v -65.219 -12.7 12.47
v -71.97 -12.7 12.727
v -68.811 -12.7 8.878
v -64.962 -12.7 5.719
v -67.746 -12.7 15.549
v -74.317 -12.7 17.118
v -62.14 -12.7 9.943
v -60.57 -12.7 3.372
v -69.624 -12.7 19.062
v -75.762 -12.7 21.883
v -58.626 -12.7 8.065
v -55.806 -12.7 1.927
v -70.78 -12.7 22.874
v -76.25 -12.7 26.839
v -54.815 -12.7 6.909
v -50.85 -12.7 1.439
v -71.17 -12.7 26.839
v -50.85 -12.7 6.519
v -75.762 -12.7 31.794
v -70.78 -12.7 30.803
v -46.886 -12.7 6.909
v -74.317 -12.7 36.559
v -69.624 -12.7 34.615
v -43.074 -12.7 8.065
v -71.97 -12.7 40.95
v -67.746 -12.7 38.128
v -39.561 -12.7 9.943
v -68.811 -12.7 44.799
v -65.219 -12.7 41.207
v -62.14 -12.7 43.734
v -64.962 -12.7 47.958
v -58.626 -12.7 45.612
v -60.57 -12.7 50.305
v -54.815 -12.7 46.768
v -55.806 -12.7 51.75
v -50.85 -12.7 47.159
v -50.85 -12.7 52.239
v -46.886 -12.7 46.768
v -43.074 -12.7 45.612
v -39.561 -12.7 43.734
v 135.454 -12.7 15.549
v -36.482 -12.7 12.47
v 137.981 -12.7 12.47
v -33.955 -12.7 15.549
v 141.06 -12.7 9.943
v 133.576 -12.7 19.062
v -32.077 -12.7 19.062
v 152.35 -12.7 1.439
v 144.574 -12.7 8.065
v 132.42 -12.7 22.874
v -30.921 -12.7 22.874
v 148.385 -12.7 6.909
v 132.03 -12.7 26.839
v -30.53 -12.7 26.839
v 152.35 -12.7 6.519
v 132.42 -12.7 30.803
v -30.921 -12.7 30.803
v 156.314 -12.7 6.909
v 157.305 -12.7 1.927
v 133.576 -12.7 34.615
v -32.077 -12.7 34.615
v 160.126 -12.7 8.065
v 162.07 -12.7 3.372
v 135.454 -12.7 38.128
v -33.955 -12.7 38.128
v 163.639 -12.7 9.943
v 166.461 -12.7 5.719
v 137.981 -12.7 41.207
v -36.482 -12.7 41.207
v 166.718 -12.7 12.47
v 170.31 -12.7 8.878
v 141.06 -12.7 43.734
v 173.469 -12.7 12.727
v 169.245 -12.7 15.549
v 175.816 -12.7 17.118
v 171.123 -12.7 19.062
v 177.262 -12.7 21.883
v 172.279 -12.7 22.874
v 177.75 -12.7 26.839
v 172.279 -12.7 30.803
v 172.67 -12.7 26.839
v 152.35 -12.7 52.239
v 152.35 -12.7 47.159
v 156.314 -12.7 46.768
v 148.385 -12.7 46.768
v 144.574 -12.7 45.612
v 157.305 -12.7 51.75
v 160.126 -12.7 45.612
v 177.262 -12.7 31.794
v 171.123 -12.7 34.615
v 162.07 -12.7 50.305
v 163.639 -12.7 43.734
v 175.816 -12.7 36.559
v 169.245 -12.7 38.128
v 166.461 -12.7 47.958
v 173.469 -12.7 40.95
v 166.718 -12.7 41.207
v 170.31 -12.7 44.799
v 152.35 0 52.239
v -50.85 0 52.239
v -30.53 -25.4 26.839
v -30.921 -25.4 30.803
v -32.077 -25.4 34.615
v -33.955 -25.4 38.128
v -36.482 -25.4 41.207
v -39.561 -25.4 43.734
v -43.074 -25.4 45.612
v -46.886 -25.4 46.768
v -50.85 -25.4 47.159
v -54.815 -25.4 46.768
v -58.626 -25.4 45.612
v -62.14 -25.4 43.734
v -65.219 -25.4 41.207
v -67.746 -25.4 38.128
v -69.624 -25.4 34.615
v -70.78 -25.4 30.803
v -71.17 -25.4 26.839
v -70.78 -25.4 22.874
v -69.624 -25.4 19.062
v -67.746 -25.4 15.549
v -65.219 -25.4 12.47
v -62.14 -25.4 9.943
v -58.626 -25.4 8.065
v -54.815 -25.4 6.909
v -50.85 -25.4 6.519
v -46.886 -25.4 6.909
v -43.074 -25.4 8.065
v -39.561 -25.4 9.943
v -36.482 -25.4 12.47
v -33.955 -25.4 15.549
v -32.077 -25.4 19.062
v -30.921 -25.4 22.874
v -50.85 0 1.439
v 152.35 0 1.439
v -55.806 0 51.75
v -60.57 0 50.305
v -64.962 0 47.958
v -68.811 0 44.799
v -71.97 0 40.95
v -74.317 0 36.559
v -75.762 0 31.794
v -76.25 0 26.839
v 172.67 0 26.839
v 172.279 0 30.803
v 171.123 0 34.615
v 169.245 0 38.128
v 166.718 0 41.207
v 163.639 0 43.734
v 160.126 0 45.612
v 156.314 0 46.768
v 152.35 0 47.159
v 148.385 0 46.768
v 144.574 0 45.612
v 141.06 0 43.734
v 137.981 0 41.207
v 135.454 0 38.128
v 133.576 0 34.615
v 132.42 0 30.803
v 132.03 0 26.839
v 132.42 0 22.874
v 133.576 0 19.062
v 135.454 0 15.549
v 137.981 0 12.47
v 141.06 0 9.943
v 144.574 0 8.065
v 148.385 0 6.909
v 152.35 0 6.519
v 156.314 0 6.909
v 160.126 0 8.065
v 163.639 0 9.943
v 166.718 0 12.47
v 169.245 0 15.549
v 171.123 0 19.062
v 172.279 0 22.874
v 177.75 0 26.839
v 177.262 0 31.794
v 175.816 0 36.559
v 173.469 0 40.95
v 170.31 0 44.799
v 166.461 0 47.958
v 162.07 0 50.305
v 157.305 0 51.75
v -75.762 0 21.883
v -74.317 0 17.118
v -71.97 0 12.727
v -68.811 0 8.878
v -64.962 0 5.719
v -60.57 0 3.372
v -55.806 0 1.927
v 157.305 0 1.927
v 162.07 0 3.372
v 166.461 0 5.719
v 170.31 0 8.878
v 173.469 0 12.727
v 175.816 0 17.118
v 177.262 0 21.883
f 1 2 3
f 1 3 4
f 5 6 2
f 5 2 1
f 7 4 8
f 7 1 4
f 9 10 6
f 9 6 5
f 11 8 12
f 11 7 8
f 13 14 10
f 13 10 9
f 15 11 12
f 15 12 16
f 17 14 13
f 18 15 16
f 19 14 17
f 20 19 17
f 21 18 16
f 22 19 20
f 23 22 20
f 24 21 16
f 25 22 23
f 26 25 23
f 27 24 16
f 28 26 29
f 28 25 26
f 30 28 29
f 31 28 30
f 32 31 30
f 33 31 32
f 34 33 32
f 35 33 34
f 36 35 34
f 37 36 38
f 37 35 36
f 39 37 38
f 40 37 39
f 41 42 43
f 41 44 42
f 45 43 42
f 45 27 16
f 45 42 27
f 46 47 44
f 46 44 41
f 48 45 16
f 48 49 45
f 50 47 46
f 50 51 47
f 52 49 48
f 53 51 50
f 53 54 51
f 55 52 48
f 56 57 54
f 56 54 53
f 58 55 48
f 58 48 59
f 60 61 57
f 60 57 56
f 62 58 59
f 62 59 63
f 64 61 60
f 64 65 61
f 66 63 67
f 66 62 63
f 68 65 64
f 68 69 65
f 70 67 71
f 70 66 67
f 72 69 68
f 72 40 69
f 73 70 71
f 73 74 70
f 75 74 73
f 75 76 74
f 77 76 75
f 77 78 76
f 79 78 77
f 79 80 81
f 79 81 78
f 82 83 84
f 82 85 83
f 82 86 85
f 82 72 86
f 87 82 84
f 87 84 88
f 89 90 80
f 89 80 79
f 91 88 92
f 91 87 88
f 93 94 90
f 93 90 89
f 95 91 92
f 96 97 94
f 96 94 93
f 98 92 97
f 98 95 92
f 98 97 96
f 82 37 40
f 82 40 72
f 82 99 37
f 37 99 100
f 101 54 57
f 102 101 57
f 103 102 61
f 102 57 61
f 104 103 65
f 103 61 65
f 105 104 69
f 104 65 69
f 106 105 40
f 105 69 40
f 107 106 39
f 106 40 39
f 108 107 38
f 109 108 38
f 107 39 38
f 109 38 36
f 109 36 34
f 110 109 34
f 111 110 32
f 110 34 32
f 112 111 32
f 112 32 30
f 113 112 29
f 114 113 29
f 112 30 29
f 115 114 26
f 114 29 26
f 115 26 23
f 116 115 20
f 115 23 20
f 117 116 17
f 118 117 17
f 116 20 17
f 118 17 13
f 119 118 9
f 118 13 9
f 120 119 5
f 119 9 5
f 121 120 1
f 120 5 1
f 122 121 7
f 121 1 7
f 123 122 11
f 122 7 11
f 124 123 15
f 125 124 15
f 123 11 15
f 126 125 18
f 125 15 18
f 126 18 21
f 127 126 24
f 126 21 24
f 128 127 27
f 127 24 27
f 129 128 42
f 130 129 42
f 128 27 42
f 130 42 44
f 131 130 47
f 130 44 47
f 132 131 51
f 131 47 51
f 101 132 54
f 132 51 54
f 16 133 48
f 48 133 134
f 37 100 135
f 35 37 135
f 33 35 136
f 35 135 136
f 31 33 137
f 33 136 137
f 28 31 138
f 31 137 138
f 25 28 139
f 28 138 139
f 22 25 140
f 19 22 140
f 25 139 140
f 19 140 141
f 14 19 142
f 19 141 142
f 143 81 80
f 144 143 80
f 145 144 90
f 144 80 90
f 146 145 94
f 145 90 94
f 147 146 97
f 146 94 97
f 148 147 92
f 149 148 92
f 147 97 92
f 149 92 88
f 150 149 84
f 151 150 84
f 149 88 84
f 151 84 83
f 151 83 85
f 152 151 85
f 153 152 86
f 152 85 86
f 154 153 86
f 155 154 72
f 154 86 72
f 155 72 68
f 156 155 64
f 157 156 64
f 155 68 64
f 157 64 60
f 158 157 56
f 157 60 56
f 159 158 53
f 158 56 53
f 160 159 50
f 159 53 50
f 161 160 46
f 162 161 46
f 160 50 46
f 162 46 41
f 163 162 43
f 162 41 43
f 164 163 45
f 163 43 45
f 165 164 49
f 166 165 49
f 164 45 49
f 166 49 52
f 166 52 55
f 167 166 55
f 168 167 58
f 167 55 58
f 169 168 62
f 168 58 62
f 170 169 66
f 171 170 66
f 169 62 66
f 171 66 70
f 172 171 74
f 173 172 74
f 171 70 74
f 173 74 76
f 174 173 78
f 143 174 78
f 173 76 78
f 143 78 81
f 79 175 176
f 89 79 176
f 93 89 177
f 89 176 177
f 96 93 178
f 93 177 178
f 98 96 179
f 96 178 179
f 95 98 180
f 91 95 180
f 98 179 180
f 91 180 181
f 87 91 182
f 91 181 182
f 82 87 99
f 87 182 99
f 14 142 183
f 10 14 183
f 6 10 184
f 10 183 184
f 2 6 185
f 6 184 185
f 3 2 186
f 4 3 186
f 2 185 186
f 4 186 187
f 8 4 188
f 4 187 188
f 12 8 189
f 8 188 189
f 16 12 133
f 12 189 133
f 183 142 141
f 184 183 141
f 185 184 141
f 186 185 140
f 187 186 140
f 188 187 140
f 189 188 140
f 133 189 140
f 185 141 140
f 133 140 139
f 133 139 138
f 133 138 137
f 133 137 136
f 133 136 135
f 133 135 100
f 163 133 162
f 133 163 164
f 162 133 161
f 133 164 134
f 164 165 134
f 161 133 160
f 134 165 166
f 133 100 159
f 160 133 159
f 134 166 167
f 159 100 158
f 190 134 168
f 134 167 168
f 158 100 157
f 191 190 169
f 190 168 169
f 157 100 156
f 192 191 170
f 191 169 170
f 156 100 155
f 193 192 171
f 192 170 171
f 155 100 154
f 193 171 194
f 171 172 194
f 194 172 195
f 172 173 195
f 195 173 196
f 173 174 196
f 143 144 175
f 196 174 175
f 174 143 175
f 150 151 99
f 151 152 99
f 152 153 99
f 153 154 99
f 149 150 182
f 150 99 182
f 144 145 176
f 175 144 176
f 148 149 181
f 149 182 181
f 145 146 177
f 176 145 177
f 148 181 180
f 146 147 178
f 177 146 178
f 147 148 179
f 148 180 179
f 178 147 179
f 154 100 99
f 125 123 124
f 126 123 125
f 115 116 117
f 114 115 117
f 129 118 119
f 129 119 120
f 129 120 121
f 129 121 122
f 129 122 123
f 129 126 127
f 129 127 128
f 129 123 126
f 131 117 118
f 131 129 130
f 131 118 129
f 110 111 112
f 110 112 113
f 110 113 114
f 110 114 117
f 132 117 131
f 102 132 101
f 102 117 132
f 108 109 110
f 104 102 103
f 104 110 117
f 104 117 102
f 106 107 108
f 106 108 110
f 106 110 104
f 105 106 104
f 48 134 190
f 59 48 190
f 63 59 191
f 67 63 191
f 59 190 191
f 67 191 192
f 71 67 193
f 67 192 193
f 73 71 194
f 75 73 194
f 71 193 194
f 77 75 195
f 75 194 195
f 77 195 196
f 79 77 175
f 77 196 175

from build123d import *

# Parameters (mm, degrees)
F2_DEPTH = 12.7
F3_R     = 20.32
F4_DEPTH = 12.7
F5_DEPTH = 12.7


# Not quite as in the source:
# - a variable given as a bare number and used for a length is read in inches; the dataset says mm whatever the document's units were


with BuildPart() as f2:
    # F1 (on Front) → F2 (new body)
    with BuildSketch(Plane.XZ):
        with BuildLine():
            Line((152.3496784632, 52.2385248174), (-50.8503215368, 52.2385248174))
            ThreePointArc((-50.8503215368, 52.2385248174), (-68.8108337789, 44.7990370595), (-76.2503215368, 26.8385248174))
            ThreePointArc((-76.2503215368, 26.8385248174), (-68.8108337789, 8.8780125752), (-50.8503215368, 1.4385248174))
            Line((-50.8503215368, 1.4385248174), (152.3496784632, 1.4385248174))
            ThreePointArc((152.3496784632, 1.4385248174), (170.3101907054, 8.8780125752), (177.7496784632, 26.8385248174))
            ThreePointArc((177.7496784632, 26.8385248174), (170.3101907054, 44.7990370595), (152.3496784632, 52.2385248174))
        make_face()
    extrude(amount=F2_DEPTH)

    # F3 (on face) → F4 (join)
    with BuildSketch(Plane.XZ.offset(12.7)):
        with Locations((-50.8503215368, 26.8385248174)):
            Circle(F3_R)
    extrude(amount=F4_DEPTH)

    # F3 (on face) → F5 (cut)
    with BuildSketch(Plane.XZ.offset(12.7)):
        with Locations((152.3496784632, 26.8385248174)):
            Circle(F3_R)
    extrude(amount=-F5_DEPTH, mode=Mode.SUBTRACT)


solid = f2.part
